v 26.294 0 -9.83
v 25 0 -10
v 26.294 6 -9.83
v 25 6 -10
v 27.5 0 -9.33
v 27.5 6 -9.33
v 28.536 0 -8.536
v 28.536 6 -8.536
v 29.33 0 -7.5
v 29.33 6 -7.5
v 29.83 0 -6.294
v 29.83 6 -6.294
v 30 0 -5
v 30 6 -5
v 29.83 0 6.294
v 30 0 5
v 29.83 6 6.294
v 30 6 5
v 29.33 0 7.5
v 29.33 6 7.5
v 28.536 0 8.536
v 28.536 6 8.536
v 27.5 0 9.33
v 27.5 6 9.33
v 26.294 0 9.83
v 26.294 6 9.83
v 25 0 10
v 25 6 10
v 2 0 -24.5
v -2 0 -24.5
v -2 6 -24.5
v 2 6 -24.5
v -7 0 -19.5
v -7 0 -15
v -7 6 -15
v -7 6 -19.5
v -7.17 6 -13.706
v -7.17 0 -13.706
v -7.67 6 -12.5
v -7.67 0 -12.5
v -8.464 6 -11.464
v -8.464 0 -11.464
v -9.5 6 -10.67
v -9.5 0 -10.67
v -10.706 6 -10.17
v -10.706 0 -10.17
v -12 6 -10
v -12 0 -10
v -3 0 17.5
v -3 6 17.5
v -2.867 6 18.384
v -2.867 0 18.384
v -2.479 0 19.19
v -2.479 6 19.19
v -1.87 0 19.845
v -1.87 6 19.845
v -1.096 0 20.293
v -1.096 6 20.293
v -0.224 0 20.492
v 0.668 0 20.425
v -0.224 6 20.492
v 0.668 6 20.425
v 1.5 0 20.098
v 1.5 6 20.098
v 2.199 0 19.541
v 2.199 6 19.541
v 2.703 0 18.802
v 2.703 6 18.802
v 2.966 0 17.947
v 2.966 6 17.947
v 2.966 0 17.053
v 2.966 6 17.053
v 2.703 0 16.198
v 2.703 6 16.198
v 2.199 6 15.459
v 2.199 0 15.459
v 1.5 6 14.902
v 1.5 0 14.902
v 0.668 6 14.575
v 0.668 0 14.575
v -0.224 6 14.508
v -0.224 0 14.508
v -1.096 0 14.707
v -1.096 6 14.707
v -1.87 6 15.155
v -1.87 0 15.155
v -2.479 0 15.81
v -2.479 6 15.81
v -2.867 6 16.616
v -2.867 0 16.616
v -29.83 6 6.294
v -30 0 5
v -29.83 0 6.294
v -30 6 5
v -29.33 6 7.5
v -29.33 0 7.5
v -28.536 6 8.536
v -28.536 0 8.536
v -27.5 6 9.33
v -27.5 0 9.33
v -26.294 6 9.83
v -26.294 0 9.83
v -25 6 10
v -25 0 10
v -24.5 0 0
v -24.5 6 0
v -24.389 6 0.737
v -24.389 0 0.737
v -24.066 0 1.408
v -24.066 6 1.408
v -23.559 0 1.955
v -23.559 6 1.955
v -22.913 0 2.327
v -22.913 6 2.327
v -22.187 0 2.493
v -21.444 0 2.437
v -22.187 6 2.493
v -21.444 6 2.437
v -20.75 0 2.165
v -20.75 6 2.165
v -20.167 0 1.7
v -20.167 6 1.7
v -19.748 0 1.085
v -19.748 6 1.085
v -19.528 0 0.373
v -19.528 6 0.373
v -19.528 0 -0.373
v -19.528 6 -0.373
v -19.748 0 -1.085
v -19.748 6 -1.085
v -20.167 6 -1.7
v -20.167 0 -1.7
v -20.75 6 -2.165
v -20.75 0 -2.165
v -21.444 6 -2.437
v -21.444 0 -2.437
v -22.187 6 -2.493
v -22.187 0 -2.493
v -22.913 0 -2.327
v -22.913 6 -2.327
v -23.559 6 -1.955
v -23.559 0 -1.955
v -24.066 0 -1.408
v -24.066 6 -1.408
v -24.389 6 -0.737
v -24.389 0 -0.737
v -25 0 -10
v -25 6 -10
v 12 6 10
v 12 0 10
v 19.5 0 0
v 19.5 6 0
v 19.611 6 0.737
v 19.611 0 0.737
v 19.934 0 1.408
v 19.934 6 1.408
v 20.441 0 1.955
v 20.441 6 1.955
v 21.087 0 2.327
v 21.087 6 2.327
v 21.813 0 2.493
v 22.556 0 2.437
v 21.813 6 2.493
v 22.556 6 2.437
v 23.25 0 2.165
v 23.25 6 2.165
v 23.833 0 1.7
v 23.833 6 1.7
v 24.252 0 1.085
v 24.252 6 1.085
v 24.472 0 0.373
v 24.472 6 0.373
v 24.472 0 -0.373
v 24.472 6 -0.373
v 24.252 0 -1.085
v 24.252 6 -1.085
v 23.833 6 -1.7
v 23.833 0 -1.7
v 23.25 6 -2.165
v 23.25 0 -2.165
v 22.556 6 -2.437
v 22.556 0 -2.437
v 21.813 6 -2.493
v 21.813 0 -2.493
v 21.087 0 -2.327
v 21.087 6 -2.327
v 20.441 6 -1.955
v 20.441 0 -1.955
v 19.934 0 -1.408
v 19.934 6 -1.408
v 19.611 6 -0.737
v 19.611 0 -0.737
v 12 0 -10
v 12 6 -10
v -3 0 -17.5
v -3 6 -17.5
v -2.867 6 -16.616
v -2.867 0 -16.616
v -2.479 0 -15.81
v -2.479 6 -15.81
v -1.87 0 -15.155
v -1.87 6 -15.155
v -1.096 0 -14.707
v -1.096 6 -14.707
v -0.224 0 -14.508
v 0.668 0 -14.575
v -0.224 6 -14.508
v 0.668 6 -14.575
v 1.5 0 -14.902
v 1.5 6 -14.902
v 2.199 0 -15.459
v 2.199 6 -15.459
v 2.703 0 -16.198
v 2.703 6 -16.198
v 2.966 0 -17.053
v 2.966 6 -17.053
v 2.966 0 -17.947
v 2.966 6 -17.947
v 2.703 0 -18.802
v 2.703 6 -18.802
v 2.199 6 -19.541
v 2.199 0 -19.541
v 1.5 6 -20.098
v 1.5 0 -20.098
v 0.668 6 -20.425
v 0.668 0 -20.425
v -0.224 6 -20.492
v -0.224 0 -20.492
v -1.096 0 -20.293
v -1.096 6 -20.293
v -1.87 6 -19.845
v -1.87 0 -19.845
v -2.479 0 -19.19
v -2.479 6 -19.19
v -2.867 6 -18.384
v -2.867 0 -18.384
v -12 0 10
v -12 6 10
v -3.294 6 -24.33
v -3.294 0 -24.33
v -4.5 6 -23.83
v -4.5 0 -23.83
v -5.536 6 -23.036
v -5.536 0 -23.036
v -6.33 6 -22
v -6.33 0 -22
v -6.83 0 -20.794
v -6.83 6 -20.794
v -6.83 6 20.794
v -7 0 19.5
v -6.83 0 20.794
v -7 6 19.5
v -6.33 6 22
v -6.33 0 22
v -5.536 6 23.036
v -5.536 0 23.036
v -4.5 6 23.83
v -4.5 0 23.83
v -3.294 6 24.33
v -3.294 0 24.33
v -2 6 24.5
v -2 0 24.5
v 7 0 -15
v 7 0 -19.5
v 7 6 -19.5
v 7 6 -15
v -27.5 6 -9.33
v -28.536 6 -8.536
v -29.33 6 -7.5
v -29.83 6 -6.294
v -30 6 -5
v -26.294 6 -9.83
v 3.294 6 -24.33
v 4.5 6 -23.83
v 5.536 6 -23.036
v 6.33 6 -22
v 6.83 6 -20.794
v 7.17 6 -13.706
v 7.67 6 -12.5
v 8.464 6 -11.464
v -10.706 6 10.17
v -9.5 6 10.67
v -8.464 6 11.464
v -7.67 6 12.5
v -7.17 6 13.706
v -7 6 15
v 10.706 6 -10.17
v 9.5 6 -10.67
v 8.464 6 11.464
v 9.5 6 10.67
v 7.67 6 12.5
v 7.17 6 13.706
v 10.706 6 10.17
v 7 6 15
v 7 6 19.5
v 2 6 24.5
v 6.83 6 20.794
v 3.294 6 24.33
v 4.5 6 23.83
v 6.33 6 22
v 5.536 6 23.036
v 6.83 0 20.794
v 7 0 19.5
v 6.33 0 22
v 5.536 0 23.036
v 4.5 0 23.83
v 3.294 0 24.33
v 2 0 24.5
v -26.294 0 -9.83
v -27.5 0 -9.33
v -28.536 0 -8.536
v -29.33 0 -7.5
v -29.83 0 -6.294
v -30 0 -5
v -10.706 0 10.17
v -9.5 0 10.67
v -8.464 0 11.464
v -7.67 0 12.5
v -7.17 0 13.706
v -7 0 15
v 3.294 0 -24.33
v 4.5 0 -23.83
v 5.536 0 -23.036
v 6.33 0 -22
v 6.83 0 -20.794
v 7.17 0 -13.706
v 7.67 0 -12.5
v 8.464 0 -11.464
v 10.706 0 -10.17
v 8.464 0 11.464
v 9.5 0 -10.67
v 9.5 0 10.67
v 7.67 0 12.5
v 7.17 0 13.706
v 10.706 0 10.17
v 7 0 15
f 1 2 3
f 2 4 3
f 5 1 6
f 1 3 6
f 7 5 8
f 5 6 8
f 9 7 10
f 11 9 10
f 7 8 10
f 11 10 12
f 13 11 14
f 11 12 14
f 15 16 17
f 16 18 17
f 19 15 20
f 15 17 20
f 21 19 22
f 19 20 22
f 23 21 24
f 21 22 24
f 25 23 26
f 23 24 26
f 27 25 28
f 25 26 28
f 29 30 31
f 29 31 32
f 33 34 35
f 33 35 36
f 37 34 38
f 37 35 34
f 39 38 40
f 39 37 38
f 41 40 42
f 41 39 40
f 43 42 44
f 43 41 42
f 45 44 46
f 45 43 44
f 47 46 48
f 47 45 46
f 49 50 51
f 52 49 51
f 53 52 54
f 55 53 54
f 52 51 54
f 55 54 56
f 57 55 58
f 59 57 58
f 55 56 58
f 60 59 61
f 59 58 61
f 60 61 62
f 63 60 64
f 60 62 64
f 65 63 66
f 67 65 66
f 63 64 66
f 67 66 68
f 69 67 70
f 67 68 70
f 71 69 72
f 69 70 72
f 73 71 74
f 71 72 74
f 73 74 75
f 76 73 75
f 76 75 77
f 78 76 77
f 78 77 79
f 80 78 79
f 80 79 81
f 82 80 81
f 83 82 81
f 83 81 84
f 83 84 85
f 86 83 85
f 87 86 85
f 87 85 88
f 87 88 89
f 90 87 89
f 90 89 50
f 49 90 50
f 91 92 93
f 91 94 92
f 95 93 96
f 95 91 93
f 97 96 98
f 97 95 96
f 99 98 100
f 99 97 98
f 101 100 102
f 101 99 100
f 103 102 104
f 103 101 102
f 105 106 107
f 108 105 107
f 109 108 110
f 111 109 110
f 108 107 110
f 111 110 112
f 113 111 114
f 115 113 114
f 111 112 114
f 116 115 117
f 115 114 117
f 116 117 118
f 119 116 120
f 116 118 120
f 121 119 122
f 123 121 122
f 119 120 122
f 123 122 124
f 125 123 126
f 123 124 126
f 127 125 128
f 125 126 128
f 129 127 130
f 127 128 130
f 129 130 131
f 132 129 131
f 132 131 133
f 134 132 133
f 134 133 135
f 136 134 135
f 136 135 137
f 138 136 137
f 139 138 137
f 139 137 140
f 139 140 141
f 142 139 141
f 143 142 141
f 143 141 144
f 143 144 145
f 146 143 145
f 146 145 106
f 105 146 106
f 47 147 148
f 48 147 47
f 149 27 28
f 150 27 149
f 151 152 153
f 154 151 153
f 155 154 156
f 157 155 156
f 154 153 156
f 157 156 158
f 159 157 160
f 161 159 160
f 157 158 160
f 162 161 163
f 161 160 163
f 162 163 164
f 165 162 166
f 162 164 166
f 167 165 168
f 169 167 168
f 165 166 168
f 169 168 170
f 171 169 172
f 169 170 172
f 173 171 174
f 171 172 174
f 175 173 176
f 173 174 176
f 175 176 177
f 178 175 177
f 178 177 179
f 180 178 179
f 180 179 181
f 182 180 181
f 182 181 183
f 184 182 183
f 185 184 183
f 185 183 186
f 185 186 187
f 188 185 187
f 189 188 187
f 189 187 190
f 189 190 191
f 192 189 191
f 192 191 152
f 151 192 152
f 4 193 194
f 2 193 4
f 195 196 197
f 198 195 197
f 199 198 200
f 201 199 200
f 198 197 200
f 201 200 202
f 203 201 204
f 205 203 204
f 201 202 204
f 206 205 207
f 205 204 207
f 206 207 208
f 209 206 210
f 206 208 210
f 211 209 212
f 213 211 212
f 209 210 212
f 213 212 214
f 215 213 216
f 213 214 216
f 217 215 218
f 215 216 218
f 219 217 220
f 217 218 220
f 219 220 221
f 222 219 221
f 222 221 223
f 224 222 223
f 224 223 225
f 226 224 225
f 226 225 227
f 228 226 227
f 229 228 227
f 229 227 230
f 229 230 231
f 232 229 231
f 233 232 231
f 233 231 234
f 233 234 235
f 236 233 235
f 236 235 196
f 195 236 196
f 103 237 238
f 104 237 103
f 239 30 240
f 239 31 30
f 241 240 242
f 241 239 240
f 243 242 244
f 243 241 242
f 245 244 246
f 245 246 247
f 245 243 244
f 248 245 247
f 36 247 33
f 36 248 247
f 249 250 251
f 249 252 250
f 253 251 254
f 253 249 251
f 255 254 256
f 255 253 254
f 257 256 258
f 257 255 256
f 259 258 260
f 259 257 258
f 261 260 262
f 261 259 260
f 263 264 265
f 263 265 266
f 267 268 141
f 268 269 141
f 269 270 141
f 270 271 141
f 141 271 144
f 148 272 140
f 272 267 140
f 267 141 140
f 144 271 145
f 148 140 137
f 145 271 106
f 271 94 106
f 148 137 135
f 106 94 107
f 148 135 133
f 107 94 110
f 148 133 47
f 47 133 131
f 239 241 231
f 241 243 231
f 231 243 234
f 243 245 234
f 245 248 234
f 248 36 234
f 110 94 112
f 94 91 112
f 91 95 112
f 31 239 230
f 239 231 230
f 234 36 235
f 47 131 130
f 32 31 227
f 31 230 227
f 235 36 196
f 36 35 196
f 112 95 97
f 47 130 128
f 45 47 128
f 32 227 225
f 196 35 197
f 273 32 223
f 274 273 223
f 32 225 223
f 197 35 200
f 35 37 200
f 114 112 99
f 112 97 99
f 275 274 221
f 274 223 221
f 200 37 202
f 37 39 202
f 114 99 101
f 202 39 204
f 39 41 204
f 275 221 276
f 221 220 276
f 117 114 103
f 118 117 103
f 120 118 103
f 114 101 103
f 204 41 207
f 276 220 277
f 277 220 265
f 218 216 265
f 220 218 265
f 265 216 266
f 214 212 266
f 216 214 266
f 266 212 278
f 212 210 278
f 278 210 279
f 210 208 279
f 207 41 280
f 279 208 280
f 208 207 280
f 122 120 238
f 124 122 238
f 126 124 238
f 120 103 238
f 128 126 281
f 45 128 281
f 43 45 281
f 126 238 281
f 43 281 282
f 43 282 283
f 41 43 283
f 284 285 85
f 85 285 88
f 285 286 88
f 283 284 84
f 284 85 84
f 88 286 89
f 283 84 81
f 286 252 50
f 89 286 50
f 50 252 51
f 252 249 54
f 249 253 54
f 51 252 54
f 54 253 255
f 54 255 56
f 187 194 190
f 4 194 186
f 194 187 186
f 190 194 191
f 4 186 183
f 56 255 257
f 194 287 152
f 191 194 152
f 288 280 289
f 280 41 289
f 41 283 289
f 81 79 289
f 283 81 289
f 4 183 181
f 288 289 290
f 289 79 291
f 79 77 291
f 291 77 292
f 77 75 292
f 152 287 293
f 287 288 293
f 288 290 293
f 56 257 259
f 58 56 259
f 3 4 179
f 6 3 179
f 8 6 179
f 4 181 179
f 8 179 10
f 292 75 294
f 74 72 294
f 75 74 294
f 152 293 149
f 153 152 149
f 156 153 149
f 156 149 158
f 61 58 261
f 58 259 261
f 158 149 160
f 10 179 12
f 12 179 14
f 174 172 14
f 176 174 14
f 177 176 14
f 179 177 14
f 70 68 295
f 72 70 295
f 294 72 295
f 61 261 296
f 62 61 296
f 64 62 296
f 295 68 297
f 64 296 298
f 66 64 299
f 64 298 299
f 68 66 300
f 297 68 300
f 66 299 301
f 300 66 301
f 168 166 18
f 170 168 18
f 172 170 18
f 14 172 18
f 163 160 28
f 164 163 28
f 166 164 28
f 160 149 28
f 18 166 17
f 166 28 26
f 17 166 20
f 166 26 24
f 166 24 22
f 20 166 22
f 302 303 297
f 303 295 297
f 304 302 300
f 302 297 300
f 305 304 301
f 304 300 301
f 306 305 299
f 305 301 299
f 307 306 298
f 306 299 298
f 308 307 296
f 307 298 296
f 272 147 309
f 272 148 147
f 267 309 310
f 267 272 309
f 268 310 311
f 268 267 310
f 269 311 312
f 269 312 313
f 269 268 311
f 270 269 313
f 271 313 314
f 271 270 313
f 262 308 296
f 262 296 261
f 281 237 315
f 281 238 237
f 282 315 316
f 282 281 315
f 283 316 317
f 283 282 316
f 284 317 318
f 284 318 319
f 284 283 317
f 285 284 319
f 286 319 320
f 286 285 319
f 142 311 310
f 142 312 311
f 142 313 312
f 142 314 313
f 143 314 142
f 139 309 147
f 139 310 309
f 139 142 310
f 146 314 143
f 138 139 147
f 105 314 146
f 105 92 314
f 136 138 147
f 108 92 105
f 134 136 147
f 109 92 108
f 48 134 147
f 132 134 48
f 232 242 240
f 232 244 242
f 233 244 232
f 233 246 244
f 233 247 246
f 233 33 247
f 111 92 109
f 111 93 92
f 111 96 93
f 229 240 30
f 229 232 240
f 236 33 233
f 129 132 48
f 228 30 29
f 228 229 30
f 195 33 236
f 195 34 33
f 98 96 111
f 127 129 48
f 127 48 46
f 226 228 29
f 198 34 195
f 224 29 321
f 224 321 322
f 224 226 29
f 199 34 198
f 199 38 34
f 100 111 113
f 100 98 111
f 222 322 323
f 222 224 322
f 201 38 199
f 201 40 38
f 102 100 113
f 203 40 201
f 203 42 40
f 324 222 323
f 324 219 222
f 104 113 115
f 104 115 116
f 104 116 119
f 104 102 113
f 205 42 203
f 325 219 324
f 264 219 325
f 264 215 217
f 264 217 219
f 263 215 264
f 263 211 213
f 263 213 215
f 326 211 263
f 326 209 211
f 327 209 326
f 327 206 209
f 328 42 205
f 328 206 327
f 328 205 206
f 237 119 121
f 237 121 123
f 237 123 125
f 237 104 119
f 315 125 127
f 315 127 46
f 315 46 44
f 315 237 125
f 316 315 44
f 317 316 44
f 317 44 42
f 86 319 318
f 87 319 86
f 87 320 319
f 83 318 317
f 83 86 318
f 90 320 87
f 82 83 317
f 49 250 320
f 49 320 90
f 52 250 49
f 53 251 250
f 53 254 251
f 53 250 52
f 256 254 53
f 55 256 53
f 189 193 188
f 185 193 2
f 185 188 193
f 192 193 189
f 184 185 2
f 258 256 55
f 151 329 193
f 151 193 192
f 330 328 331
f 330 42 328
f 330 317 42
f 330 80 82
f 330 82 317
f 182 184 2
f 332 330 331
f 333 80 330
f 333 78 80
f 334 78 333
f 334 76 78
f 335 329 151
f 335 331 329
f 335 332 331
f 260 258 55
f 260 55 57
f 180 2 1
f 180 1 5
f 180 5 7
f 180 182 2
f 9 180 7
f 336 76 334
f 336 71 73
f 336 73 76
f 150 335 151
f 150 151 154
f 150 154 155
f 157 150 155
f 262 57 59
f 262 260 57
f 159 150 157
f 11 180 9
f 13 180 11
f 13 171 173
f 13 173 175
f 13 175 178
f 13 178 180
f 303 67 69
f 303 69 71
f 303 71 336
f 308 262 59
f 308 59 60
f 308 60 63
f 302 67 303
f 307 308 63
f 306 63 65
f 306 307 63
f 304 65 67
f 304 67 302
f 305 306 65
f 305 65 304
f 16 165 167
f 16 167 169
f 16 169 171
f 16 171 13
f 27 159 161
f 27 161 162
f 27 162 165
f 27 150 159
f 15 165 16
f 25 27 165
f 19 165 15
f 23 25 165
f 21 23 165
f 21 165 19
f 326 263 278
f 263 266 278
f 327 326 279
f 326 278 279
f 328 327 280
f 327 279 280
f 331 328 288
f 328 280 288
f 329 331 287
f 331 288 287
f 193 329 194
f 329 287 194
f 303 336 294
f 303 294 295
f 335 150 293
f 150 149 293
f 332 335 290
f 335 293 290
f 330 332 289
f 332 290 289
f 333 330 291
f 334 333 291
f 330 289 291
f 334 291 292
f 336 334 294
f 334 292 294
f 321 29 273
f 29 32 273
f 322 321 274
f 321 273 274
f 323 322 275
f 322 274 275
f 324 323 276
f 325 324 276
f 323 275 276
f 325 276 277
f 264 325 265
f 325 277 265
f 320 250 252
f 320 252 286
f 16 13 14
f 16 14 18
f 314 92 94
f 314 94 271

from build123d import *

# Parameters (mm, degrees)
F1_DEPTH = 6
F2_D     = 6
F3_D     = 5
F4_R     = 5


with BuildPart() as f1:
    # F0 (on Front) → F1 (new body)
    with BuildSketch(Plane.XZ):
        Polygon((-7, -24.5), (7, -24.5), (7, -10), (30, -10), (30, 10), (7, 10), (7, 24.5), (-7, 24.5), (-7, 10), (-30, 10), (-30, -10), (-7, -10), align=None)
    extrude(amount=-F1_DEPTH)

    # F2 (through all)
    with Locations(Plane.XZ):
        with Locations((0, 17.5), (0, -17.5)):
            Hole(F2_D / 2)

    # F3 (through all)
    with Locations(Plane.XZ):
        with Locations((22, 0), (-22, 0)):
            Hole(F3_D / 2)

    # F4
    f4_edges = [f1.edges().sort_by_distance(p)[0] for p in [
        (7, 3, 24.5),
        (7, 3, 10),
        (30, 3, 10),
        (30, 3, -10),
        (7, 3, -24.5),
        (7, 3, -10),
        (-7, 3, -24.5),
        (-30, 3, -10),
        (-7, 3, -10),
        (-30, 3, 10),
        (-7, 3, 10),
        (-7, 3, 24.5),
    ]]
    fillet(f4_edges, radius=F4_R)


solid = f1.part
